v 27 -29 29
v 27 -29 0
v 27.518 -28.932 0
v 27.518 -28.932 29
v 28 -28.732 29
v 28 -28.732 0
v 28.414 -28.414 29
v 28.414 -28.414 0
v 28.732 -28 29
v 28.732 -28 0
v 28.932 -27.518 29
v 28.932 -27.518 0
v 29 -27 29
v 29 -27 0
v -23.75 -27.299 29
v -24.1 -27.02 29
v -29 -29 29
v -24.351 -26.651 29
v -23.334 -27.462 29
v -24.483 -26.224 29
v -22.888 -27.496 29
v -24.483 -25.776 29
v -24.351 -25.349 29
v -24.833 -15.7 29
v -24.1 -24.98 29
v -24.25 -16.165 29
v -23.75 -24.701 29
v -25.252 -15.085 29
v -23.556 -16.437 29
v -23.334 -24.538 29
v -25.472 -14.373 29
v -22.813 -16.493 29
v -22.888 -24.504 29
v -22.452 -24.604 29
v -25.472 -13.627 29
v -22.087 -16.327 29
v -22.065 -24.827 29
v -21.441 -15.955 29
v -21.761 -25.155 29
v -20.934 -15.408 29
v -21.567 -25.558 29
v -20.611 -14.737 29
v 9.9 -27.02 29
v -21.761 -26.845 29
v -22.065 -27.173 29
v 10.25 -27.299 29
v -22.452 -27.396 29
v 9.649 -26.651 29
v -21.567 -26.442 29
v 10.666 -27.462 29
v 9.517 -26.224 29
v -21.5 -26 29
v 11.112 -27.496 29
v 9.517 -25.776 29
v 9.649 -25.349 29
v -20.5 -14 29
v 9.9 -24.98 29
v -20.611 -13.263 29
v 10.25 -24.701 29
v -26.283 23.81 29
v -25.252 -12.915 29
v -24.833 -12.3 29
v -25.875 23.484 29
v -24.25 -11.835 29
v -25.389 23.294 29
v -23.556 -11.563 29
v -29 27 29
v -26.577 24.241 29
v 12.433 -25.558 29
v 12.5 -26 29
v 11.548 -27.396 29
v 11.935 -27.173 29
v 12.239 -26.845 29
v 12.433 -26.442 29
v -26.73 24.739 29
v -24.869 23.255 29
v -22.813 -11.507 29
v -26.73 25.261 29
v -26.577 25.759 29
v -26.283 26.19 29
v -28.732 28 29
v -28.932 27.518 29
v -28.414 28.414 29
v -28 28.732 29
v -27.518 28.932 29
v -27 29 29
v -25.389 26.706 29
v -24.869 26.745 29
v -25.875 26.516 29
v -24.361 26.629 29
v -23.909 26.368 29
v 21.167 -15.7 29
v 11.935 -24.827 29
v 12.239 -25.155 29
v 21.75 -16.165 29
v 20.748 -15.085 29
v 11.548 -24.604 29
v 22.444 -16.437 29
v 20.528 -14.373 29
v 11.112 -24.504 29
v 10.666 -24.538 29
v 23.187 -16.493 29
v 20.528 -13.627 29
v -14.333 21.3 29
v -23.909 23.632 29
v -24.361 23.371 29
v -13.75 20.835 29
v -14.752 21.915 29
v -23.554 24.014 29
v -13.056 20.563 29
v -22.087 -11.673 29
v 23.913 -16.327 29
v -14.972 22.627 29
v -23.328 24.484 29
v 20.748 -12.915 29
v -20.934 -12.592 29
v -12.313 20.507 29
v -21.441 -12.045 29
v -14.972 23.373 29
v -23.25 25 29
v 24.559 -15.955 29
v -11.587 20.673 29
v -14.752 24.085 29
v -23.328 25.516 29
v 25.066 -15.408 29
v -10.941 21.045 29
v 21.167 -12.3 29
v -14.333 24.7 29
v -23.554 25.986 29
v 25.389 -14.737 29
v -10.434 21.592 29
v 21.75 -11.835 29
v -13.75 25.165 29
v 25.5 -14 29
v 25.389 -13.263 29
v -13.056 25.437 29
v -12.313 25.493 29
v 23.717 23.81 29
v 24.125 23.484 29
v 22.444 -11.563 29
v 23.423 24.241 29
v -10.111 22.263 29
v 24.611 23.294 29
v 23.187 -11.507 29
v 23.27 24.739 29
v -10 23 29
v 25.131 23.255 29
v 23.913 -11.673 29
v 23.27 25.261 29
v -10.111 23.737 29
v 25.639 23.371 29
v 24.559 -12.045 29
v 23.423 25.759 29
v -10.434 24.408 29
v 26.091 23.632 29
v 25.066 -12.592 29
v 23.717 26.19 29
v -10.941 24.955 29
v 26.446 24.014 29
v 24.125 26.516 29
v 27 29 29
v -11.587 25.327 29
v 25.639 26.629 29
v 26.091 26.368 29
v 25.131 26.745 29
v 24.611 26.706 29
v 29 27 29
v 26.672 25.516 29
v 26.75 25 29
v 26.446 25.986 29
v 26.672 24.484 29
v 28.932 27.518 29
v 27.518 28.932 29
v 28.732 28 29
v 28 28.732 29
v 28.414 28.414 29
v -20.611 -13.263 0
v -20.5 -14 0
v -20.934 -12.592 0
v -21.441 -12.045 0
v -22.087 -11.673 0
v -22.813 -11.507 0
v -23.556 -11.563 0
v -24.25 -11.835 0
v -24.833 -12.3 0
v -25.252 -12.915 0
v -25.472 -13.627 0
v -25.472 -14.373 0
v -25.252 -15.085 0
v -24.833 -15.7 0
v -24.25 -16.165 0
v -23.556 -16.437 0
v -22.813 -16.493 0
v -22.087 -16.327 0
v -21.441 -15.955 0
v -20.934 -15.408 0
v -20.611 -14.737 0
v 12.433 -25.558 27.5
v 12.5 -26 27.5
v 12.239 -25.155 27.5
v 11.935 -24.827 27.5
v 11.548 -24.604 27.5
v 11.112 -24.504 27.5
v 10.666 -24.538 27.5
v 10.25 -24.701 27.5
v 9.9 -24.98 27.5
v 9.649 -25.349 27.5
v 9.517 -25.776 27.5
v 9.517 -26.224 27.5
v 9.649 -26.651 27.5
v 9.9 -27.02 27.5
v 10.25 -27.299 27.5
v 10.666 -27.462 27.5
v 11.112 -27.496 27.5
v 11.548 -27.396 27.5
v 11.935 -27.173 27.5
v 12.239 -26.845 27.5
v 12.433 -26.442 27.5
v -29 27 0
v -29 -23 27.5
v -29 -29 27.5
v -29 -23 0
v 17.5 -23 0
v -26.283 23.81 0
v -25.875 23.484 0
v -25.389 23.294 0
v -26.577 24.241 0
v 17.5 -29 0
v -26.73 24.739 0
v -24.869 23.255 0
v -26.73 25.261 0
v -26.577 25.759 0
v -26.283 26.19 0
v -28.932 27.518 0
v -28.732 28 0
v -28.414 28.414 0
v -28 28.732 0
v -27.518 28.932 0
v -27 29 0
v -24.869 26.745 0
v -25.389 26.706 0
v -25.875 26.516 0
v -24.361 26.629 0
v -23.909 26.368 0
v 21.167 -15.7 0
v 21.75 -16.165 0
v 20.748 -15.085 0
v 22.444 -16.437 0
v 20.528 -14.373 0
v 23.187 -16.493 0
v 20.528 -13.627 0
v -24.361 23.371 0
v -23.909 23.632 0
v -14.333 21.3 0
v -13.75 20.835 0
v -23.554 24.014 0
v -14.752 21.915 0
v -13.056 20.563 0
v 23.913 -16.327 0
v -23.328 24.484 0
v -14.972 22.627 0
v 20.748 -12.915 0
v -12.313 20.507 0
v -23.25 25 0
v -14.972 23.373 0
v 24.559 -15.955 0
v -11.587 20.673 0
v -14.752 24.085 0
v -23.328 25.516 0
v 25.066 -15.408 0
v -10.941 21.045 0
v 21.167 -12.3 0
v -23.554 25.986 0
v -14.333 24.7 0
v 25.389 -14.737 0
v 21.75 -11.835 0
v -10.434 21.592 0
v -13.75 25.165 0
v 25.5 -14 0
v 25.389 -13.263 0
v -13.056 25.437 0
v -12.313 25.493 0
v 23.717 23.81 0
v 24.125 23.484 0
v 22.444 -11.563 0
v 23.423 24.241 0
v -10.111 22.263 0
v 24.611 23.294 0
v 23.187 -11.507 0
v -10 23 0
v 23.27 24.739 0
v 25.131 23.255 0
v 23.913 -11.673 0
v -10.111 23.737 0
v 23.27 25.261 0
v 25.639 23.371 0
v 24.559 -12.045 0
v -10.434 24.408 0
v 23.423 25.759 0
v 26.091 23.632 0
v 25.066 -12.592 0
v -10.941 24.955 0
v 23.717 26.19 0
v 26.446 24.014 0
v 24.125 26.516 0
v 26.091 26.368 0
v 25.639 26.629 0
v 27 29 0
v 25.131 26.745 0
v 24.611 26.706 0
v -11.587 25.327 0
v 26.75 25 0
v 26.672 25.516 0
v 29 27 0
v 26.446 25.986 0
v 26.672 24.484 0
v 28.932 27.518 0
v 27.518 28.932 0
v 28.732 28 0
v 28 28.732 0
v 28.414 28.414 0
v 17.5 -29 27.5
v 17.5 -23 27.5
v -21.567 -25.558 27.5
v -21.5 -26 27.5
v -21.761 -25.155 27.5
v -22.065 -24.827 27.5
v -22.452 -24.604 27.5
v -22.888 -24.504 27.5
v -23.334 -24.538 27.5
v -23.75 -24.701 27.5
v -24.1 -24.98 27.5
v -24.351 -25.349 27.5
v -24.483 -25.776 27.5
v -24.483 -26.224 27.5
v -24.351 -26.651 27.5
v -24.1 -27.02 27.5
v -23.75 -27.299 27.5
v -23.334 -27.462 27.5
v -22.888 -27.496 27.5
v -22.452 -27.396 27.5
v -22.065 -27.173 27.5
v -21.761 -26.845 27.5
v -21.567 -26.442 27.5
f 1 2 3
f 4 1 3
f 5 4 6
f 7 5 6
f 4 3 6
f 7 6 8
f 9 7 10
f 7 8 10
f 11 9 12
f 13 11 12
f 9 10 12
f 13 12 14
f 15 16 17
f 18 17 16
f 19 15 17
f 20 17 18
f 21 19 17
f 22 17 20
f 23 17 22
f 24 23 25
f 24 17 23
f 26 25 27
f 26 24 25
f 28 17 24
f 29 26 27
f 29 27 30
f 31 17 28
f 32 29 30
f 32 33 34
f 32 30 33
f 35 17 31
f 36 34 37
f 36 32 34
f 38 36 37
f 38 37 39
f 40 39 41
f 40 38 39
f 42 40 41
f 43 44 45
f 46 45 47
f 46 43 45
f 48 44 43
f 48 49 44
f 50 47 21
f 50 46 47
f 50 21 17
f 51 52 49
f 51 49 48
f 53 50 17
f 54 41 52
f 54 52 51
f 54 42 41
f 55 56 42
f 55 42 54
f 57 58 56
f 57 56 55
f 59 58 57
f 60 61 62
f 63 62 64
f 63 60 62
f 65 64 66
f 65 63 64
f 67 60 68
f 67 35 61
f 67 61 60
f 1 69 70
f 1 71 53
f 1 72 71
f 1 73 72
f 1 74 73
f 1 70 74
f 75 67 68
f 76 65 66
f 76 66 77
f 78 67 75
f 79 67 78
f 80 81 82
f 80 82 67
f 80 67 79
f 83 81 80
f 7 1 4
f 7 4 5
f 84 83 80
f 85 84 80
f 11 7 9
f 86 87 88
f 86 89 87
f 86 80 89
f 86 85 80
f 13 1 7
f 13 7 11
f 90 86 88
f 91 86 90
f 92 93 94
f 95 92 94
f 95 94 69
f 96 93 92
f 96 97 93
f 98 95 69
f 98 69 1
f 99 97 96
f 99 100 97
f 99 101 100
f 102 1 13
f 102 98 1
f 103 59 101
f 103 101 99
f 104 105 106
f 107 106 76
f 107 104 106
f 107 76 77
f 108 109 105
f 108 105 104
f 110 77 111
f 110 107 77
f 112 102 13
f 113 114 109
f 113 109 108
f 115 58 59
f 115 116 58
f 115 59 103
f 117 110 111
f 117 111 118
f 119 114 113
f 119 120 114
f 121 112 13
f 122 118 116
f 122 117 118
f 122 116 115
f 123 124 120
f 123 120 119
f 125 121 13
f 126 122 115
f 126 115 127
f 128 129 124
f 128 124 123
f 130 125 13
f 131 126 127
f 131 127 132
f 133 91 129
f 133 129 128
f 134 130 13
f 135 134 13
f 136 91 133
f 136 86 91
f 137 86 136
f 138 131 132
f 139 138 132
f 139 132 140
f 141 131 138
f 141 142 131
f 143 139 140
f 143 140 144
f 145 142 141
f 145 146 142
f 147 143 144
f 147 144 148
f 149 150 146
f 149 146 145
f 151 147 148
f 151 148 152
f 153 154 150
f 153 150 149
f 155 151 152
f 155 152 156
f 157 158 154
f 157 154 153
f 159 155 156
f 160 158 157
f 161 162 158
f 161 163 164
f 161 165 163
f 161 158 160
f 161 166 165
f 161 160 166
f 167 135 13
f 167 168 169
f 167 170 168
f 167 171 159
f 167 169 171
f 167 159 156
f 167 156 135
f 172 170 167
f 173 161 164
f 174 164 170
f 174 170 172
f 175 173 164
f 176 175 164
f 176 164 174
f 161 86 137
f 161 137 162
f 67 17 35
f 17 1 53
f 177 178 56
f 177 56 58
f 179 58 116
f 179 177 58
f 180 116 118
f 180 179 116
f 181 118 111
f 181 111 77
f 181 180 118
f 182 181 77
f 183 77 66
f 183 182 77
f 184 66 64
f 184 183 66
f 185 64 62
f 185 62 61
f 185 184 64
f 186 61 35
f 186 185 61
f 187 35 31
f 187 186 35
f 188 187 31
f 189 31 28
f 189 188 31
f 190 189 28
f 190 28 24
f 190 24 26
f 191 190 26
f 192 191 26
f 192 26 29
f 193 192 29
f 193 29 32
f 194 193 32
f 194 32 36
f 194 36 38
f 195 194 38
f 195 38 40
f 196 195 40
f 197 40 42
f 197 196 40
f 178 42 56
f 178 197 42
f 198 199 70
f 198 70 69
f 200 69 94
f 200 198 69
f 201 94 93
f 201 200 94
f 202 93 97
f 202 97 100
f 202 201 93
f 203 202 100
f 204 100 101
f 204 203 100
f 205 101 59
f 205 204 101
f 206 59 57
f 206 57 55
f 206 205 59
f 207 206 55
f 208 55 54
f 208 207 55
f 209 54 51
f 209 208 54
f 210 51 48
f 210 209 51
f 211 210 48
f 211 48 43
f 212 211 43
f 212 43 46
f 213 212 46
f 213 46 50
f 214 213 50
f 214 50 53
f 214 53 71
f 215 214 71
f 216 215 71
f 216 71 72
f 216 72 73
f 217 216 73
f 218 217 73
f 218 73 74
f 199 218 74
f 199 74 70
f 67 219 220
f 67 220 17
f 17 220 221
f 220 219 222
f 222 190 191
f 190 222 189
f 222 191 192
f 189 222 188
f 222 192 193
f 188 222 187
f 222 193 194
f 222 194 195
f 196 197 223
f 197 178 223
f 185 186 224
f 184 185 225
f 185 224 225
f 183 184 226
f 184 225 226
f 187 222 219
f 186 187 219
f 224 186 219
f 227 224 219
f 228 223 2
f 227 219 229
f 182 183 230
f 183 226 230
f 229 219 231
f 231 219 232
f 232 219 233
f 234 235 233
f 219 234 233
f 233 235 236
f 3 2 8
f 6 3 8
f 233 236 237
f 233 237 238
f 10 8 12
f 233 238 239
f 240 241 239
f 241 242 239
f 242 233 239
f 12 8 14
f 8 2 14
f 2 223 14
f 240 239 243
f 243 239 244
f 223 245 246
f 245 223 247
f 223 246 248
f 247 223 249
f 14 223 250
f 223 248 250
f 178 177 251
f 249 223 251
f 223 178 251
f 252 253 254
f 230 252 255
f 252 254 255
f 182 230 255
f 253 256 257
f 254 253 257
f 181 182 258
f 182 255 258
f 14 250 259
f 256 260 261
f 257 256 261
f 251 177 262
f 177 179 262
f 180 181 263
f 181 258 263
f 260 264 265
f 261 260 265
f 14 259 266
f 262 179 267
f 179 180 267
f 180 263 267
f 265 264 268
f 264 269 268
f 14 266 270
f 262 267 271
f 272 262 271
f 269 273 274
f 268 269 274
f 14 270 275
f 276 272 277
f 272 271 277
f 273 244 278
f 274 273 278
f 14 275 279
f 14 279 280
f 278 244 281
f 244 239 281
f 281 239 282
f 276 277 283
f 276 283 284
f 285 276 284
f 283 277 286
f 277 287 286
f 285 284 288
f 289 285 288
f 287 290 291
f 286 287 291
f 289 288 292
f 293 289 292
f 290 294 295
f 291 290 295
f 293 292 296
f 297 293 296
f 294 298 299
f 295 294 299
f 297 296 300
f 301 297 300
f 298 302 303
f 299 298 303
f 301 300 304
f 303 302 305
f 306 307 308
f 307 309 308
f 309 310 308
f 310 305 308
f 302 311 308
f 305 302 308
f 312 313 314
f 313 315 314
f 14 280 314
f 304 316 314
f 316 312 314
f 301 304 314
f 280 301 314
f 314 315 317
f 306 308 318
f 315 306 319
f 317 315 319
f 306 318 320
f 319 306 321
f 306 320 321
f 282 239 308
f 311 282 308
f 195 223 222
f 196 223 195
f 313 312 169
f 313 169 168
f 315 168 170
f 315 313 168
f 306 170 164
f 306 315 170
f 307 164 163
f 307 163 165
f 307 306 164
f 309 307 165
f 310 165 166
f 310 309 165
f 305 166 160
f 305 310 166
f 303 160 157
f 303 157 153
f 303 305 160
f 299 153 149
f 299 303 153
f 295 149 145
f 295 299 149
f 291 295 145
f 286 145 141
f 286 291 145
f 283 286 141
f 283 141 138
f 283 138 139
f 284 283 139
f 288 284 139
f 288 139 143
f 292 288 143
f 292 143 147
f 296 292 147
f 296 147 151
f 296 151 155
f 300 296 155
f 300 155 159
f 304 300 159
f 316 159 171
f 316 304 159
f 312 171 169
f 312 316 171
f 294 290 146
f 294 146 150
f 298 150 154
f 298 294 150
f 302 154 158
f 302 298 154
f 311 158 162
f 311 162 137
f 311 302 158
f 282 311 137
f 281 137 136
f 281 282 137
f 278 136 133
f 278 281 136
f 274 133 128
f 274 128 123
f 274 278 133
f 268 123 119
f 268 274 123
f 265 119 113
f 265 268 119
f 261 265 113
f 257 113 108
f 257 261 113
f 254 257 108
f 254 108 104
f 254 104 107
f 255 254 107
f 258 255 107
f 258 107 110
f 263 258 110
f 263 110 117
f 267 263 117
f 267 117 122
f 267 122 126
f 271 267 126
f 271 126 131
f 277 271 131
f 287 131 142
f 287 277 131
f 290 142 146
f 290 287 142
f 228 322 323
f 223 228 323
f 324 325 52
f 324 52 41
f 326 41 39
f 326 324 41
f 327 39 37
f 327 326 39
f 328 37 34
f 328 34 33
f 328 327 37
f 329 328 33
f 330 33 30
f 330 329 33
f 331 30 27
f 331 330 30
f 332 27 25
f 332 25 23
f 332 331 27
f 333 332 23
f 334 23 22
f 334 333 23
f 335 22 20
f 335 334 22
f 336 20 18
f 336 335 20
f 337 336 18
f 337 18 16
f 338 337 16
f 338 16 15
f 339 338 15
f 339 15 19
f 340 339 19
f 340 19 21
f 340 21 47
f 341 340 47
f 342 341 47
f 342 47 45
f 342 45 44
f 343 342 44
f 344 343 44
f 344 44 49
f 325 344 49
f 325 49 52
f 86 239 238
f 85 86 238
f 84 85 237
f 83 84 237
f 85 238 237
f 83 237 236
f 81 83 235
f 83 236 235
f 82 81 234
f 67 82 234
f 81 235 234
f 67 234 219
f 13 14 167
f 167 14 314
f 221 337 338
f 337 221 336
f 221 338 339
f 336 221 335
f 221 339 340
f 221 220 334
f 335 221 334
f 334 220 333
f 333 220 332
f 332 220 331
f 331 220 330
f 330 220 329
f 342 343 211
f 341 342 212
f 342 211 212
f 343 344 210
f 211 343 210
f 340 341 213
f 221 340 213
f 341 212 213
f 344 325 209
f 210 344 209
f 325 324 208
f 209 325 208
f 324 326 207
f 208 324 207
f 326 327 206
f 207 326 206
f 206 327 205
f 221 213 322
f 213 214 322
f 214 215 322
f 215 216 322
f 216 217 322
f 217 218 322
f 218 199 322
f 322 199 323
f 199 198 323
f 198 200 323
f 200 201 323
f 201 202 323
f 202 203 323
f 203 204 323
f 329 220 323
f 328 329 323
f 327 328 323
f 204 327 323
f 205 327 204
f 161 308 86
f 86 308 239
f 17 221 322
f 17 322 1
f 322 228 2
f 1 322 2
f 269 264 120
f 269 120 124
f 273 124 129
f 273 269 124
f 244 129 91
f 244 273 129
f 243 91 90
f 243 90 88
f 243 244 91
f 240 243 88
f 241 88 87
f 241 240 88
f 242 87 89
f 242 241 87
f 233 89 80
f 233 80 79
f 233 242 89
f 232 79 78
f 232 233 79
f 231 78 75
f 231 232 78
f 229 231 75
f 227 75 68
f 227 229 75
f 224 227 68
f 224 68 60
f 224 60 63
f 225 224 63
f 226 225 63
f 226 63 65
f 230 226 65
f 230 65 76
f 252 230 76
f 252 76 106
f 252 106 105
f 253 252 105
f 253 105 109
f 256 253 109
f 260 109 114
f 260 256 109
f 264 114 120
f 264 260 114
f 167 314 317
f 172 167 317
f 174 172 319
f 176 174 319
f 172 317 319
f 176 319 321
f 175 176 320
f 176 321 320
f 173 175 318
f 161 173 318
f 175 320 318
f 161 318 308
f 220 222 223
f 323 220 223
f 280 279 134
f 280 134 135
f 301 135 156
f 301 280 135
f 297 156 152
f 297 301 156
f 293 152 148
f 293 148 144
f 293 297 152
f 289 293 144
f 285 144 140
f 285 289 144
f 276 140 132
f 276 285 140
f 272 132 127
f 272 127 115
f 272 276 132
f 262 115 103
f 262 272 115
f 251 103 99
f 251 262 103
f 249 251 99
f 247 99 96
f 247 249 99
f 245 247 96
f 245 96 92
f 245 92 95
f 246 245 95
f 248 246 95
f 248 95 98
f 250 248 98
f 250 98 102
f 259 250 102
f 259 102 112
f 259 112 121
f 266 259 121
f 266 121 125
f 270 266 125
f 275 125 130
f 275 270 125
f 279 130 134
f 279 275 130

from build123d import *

# Parameters (mm, degrees)
SKETCH1_R           = 1.5
SKETCH1_R_2         = 2.5
SKETCH1_R_3         = 1.75
BOSS_EXTRUDE1_DEPTH = 29
SKETCH1_3_W         = 46.5
SKETCH1_3_H         = 6
SKETCH1_3_R         = 1.5
CUT_EXTRUDE1_DEPTH  = 27.5


with BuildPart() as part:
    # Sketch1 → Boss-Extrude1 (new body)
    with BuildSketch(Plane.XY):
        with BuildLine():
            Line((-29, -29), (27, -29))
            ThreePointArc((27, -29), (28.414213562, -28.414213562), (29, -27))
            Line((29, -27), (29, 27))
            ThreePointArc((29, 27), (28.414213562, 28.414213562), (27, 29))
            Line((27, 29), (-27, 29))
            ThreePointArc((-27, 29), (-28.414213562, 28.414213562), (-29, 27))
            Line((-29, 27), (-29, -29))
        make_face()
        with Locations((-23, -26)):
            Circle(SKETCH1_R, mode=Mode.SUBTRACT)
        with Locations((11, -26)):
            Circle(SKETCH1_R, mode=Mode.SUBTRACT)
        with Locations((-12.5, 23)):
            Circle(SKETCH1_R_2, mode=Mode.SUBTRACT)
        with Locations((25, 25)):
            Circle(SKETCH1_R_3, mode=Mode.SUBTRACT)
        with Locations((-23, -14)):
            Circle(SKETCH1_R_2, mode=Mode.SUBTRACT)
        with Locations((23, -14)):
            Circle(SKETCH1_R_2, mode=Mode.SUBTRACT)
        with Locations((-25, 25)):
            Circle(SKETCH1_R_3, mode=Mode.SUBTRACT)
    extrude(amount=BOSS_EXTRUDE1_DEPTH)

    # Sketch1<3> → Cut-Extrude1 (cut)
    with BuildSketch(Plane.XY):
        with Locations((-5.75, -26)):
            Rectangle(SKETCH1_3_W, SKETCH1_3_H)
        with Locations((-23, -26)):
            Circle(SKETCH1_3_R, mode=Mode.SUBTRACT)
        with Locations((11, -26)):
            Circle(SKETCH1_3_R, mode=Mode.SUBTRACT)
    extrude(amount=CUT_EXTRUDE1_DEPTH, mode=Mode.SUBTRACT)


solid = part.part
